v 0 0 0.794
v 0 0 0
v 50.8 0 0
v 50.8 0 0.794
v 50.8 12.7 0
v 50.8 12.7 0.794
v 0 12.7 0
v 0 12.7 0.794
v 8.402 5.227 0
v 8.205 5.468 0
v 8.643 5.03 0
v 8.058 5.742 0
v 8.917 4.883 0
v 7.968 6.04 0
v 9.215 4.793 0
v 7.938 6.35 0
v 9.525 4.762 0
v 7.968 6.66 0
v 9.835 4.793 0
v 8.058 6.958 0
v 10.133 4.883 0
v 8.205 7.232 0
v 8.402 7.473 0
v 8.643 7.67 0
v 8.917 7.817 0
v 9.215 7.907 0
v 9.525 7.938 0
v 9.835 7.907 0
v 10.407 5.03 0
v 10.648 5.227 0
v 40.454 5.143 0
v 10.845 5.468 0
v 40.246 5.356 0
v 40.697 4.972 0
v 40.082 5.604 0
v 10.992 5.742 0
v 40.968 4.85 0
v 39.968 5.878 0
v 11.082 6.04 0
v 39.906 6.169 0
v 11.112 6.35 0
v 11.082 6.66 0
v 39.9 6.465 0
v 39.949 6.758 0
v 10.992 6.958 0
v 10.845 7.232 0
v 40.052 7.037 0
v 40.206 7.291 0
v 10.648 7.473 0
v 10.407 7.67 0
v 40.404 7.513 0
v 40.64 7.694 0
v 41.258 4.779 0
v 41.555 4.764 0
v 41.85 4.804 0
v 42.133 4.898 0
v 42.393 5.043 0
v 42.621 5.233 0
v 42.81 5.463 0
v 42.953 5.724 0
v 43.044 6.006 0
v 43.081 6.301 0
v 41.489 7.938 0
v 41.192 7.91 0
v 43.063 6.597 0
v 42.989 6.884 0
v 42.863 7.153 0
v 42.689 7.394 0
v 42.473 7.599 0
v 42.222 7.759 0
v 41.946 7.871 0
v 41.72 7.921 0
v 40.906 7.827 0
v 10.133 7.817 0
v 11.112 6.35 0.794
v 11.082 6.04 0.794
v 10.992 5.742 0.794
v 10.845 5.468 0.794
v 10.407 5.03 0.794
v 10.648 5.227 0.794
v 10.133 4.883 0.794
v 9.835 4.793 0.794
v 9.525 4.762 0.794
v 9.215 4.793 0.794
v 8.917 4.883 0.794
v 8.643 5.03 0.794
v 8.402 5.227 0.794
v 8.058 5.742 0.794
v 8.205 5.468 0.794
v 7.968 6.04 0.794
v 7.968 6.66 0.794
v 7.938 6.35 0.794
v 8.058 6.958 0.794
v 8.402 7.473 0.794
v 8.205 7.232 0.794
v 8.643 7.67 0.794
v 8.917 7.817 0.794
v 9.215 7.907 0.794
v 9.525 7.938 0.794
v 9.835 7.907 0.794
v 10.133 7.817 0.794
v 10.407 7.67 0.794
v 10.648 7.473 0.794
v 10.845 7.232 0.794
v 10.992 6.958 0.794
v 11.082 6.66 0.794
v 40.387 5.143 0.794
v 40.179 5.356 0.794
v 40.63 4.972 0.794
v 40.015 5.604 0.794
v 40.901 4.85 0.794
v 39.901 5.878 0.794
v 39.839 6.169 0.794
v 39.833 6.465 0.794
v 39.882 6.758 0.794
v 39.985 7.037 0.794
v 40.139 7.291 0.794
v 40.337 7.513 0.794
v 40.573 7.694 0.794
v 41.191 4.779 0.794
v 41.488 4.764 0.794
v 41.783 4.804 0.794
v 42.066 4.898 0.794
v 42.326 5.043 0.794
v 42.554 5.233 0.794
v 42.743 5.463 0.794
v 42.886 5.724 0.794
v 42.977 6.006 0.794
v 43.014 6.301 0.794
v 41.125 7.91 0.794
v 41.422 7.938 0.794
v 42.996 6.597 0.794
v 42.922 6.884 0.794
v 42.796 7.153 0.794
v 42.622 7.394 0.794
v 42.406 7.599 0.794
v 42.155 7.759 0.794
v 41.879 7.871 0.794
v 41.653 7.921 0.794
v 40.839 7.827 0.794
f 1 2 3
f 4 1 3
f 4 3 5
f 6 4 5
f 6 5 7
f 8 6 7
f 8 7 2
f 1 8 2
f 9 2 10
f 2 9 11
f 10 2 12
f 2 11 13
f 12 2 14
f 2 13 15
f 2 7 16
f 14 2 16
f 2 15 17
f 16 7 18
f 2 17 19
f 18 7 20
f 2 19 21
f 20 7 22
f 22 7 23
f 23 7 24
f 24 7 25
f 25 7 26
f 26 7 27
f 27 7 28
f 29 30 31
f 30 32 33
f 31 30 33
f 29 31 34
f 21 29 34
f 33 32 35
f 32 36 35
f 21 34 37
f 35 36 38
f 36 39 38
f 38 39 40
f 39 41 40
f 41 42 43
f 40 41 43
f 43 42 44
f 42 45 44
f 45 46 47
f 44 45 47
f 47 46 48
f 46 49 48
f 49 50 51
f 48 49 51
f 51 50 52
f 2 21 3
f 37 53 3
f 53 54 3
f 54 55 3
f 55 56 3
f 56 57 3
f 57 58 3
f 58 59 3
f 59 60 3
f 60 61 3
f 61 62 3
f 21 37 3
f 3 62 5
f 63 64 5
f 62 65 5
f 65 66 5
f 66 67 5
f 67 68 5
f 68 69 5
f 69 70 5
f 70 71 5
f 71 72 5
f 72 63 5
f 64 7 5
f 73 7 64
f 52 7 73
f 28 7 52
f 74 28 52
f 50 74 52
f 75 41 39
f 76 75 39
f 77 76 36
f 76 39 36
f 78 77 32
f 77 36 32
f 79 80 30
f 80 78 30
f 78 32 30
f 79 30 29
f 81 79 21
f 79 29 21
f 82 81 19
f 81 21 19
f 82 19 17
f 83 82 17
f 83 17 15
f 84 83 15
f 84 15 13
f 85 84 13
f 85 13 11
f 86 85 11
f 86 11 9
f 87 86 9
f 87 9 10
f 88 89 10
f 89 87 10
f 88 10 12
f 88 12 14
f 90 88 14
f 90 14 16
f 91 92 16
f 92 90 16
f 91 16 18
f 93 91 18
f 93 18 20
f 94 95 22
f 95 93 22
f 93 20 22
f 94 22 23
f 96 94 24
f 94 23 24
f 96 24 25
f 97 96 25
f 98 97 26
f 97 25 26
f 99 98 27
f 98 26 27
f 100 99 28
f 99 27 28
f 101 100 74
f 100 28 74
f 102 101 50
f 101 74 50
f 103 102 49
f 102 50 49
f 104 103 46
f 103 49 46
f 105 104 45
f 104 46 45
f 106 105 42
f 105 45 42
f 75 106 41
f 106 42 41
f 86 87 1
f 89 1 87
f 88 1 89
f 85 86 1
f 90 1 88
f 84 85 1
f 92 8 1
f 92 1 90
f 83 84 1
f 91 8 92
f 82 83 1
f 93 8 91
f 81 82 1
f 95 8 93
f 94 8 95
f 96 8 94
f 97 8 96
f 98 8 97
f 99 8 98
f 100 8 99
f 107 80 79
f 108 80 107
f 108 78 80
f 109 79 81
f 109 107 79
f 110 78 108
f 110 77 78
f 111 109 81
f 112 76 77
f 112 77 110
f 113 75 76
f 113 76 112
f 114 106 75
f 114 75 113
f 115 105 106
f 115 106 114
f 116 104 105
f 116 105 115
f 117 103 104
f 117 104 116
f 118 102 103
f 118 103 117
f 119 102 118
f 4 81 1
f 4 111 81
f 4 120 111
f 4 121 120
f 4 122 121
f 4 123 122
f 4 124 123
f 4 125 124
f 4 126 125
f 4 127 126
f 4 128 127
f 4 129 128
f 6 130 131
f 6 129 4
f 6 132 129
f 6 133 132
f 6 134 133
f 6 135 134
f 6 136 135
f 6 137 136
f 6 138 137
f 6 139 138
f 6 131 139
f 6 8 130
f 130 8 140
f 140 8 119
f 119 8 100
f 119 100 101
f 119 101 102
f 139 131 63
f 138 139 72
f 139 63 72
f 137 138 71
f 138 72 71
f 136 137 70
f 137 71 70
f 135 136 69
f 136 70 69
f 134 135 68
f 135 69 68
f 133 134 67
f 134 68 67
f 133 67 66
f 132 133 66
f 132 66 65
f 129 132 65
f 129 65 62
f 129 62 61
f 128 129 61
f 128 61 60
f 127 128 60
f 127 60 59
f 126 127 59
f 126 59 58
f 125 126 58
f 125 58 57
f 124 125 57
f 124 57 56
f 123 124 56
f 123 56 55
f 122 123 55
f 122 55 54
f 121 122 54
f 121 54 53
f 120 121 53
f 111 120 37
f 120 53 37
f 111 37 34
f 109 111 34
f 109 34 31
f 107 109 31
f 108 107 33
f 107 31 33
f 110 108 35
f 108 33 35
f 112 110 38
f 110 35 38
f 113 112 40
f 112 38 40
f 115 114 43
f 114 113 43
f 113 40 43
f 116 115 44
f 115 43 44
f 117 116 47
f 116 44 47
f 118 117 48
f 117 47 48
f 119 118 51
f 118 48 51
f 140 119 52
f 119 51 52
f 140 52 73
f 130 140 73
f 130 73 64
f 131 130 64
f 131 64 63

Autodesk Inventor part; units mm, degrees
ref_plane "YZ Plane" through (0, 0, 0) normal (1, 0, 0) x (0, 1, 0)
ref_plane "XZ Plane" through (0, 0, 0) normal (0, 1, 0) x (-1, 0, 0)
sketch "Sketch1" plane through (0, 0, 0) normal (0, 0, 1) x (1, 0, 0)
  line L0 (0, 0) -> (50.8, 0)
  line L1 (50.8, 0) -> (50.8, 12.7)
  line L2 (50.8, 12.7) -> (0, 12.7)
  line L3 (0, 12.7) -> (0, 0)
  line L4 (25.4, 12.7) -> (25.4, 0) construction
  line L5 (9.525, 6.35) -> (41.275, 6.35) construction
  circle A0 centre (9.525, 6.35) radius 1.5875
  circle A1 centre (41.275, 6.35) radius 1.5875
  point P0 (25.4, 6.35)
  dimension "d0" = 12.7
  dimension "d1" = 50.8
  dimension "d2" = 3.175
  dimension "d3" = 9.525
extrude "Extrusion1" add sketch "Sketch1" along normal blind 0.7937 contours L3 L2 L1 L0 | A1
ref_plane "Work Plane2" through (117.4846, -2.3812, 5.6317) normal (-0.0842, 0, 0.9965) x (0, 1, 0)
sketch "Sketch2" plane through (117.4846, -2.3812, 5.6317) normal (-0.0842, 0, 0.9965) x (0, 1, 0)
  circle A0 centre (8.7312, 76.2) radius 1.5875 projected
  line L0 (18.2562, 0) -> (0, 0) construction
  line L1 (18.2562, 0) -> (18.2562, 92.075) construction
  line L2 (0, 92.075) -> (18.2562, 92.075) construction
  line L3 (0, 0) -> (0, 92.075) construction
  point P0 (2.3812, 117.5418)
extrude "Extrusion2" cut sketch "Sketch2" along normal through all
properties part number "Hopper Bracing P12 to P1" material "Aluminum 6061"
